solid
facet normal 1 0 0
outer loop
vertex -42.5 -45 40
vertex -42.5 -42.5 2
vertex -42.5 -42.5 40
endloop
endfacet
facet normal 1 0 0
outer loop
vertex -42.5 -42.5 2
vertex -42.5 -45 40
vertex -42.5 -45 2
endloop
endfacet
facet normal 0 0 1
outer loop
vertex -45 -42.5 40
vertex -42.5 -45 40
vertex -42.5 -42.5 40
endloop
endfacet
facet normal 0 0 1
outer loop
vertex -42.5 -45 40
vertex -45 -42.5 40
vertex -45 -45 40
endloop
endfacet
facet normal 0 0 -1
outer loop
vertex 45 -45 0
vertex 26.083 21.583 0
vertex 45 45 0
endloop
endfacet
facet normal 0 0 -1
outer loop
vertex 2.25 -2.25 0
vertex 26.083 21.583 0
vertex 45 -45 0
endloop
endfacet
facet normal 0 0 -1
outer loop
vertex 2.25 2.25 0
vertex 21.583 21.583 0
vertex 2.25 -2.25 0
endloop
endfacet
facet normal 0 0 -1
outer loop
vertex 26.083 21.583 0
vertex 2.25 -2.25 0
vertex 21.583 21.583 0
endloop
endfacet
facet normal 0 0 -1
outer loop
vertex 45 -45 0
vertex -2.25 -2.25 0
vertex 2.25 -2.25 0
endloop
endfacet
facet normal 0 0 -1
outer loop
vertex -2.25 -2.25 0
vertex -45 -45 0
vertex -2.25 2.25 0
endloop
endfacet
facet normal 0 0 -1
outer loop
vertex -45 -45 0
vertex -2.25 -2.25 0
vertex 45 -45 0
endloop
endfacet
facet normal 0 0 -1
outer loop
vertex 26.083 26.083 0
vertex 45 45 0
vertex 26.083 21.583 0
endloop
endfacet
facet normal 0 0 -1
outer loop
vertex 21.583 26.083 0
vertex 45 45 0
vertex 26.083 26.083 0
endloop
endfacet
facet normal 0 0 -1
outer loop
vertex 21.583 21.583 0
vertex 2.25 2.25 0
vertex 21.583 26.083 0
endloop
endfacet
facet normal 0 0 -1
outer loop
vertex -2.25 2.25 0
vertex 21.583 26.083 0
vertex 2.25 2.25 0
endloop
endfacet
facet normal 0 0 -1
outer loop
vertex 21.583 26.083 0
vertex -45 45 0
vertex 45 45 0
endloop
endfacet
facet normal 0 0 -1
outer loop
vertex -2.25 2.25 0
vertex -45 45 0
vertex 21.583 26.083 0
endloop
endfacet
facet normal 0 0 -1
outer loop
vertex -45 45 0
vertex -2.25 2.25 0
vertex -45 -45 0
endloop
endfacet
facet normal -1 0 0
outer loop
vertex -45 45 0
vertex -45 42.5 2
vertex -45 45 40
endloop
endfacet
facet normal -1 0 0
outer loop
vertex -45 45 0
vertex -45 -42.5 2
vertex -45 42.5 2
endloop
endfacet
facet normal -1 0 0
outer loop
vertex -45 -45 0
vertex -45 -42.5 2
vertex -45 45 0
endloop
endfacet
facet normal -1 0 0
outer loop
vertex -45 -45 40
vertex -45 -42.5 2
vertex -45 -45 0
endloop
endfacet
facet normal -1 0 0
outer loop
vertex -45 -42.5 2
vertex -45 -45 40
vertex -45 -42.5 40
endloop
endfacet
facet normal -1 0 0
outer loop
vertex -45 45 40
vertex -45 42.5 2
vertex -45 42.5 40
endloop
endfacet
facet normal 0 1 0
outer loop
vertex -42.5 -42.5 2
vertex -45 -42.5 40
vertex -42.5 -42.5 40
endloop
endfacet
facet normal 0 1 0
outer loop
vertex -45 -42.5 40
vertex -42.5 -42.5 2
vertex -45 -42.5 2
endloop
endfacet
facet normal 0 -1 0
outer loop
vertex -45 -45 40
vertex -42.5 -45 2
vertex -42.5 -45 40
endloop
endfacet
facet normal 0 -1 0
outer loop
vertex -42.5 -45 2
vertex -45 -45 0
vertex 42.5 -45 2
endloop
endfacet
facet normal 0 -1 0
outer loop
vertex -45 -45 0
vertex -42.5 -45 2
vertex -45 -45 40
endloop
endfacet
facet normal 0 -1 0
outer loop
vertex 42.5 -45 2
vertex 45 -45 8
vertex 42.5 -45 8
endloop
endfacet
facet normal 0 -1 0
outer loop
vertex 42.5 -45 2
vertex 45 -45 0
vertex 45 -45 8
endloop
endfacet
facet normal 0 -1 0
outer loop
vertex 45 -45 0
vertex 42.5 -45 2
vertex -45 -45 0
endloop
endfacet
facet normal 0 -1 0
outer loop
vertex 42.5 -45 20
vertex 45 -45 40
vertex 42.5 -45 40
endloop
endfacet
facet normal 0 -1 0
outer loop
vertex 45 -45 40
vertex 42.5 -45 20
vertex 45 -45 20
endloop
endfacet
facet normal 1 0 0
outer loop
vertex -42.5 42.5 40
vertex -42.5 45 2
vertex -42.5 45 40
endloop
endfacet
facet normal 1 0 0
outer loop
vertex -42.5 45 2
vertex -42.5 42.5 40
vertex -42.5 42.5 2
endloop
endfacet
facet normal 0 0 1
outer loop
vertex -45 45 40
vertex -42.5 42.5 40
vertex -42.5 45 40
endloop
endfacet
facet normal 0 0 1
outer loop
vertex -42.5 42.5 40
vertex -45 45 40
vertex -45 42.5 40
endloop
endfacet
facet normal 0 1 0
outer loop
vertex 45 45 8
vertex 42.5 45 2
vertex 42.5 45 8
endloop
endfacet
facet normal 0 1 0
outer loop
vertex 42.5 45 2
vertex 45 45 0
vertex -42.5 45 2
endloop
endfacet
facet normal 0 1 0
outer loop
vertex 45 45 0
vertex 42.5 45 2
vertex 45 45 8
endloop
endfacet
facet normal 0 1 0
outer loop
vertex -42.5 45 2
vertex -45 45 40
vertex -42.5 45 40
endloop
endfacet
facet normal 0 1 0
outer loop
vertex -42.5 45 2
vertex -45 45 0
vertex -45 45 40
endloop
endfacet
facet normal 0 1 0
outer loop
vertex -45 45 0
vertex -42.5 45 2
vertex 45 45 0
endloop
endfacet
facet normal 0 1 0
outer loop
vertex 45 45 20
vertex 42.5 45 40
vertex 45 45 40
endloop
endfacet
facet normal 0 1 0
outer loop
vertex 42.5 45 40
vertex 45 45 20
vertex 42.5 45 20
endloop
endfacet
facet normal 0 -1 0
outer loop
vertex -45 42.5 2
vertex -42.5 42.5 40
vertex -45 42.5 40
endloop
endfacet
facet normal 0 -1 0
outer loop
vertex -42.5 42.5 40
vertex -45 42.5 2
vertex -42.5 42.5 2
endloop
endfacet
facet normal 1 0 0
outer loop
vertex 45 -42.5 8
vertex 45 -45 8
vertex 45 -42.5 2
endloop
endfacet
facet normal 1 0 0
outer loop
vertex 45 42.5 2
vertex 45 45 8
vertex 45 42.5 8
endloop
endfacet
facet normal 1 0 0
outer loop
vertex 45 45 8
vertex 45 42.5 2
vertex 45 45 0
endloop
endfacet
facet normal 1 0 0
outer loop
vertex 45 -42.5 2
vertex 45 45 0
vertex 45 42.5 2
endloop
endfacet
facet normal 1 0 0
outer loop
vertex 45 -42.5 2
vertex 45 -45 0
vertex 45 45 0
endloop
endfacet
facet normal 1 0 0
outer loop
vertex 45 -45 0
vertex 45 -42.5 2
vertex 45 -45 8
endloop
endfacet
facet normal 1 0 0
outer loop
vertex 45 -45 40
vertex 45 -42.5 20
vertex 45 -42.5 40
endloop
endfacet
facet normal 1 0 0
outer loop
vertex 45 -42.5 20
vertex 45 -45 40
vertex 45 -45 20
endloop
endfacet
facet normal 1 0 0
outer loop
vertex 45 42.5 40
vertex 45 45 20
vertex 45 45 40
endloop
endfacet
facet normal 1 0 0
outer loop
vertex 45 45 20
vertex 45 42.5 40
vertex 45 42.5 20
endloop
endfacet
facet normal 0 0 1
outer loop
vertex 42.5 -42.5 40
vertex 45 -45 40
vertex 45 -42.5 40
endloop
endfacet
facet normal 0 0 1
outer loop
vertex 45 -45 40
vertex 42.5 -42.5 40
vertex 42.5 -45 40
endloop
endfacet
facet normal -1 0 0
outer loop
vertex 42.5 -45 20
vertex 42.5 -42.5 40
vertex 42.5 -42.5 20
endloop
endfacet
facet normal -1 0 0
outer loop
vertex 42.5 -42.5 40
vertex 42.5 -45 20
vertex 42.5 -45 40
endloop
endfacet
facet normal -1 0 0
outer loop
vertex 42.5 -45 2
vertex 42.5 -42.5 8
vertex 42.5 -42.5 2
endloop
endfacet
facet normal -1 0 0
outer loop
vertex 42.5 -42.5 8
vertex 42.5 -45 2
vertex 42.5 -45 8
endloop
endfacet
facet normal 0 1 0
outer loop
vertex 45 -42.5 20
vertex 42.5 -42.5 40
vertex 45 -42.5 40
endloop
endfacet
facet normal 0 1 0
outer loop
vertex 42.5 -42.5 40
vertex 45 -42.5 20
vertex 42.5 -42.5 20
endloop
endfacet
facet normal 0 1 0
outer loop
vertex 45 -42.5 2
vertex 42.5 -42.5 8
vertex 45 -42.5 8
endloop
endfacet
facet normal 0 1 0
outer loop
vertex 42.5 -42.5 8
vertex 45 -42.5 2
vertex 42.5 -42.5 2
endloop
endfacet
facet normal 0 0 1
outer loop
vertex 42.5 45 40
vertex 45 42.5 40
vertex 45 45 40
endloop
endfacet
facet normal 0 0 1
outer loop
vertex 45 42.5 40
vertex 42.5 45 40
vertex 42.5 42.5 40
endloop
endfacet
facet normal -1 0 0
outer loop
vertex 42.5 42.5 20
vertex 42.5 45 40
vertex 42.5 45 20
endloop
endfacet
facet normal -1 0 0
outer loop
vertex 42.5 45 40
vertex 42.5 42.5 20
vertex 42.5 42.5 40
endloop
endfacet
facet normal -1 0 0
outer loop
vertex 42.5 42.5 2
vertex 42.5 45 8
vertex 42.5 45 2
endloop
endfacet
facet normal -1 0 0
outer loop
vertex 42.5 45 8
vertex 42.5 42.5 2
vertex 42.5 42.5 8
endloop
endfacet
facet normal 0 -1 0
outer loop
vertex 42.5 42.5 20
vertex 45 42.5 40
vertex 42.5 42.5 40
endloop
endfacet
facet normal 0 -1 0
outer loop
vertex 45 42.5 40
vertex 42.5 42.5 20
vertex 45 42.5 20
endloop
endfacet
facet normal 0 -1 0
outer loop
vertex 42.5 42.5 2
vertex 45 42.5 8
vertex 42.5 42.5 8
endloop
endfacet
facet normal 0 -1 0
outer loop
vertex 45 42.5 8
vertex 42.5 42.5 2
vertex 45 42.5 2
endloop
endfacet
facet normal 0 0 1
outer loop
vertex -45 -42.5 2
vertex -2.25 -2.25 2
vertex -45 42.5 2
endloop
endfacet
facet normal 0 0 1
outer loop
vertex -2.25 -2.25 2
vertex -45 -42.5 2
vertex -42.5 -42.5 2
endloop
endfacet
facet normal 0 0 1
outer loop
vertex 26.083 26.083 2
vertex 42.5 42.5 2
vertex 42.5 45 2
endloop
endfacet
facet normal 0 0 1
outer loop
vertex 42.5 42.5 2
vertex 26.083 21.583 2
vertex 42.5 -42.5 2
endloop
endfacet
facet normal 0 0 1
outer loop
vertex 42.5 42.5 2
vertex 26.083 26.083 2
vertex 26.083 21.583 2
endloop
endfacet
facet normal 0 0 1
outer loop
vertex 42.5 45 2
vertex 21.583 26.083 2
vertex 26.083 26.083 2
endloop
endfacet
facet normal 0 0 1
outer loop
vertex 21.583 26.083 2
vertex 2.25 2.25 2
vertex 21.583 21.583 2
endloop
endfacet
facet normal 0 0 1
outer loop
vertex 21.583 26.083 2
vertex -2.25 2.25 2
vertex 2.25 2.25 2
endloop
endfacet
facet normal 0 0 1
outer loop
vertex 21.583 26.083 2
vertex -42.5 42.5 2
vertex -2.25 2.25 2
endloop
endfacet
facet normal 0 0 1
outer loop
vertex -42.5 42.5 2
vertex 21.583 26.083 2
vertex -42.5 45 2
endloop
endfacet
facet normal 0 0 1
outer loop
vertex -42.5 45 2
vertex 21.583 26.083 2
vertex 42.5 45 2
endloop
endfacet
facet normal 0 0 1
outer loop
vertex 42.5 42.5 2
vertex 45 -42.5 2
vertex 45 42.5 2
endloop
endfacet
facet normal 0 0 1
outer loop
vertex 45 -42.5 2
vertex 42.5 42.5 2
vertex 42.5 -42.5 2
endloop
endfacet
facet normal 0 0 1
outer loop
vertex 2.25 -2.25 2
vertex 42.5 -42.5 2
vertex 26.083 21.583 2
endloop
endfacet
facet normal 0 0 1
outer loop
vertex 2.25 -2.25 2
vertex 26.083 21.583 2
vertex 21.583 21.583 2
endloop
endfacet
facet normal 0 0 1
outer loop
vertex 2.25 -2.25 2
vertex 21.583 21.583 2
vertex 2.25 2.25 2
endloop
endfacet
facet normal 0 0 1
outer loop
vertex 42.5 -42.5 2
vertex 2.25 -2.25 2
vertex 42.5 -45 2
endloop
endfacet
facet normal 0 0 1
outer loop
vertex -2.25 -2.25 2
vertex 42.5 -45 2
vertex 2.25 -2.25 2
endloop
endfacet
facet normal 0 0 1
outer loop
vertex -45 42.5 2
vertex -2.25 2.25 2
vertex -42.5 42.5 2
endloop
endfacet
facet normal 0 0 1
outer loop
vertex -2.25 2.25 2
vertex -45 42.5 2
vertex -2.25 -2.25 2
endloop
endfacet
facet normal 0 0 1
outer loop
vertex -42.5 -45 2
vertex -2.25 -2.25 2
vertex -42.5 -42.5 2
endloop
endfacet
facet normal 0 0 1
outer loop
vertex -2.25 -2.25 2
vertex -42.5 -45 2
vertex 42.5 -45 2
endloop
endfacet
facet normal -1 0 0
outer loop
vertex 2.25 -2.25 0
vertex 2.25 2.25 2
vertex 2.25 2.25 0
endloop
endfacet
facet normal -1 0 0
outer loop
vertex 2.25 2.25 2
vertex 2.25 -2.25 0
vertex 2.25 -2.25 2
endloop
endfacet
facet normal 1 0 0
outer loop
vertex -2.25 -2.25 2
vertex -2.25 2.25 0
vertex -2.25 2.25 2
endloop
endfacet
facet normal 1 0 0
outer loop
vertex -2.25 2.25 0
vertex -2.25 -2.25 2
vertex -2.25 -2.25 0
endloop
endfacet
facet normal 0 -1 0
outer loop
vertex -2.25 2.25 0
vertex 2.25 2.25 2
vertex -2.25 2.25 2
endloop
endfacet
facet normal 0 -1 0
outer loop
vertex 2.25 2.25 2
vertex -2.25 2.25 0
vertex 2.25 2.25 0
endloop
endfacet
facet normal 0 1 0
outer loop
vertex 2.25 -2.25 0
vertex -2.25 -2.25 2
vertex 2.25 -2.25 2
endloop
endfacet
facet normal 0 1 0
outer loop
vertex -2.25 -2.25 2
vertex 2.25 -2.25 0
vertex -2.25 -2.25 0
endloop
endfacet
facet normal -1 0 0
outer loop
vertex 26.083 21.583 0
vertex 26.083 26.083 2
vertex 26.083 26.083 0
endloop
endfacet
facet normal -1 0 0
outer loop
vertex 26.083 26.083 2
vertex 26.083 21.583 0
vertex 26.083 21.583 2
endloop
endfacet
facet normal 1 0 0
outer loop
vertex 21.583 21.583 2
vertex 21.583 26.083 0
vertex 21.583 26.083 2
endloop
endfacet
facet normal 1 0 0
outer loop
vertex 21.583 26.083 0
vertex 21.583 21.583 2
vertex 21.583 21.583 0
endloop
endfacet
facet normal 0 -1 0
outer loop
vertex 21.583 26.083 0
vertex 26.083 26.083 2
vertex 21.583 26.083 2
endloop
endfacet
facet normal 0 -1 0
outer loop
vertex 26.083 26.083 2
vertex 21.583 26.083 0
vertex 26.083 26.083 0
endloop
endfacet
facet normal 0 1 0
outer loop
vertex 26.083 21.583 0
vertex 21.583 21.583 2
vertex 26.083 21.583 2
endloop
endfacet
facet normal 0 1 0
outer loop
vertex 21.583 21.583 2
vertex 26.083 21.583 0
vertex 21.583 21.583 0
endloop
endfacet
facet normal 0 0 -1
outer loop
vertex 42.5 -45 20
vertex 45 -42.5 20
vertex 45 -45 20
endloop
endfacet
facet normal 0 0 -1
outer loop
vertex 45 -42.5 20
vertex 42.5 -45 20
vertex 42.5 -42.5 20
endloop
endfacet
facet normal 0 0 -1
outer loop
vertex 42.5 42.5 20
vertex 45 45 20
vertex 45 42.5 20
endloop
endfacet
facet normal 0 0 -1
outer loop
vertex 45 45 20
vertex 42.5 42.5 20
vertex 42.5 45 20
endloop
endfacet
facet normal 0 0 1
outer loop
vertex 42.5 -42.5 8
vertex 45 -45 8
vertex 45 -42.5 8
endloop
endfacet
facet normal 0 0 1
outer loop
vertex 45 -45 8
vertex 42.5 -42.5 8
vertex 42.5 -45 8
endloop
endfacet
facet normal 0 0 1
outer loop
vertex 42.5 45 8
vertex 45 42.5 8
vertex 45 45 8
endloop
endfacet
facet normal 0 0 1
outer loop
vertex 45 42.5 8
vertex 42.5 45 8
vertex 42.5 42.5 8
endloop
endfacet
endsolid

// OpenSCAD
// Magnetic stirrer housing (print orientation: upside down)
// Units: mm

// ---- Top plate ----
plate_t      = 2;     // plate thickness (z = 0 to 2)
plate_x      = 90;    // plate outer size in X
plate_y      = 90;    // plate outer size in Y

// ---- Walls ----
wall_t       = 2.5;   // wall thickness
wall_top_z   = 40;    // open top of box (walls rise from plate to this)

// ---- Screw holes ----
hole_d       = 4.5;   // M4 screw hole diameter
hole_n       = 4;     // number of holes
hole_pitch   = 71.5;  // square pattern side length

// ---- Cable notch ----
notch_w      = 12;    // notch width along wall
notch_bottom = 8;     // notch depth from open edge (z = 32 to 40)

// ---- Misc ----
eps          = 0.5;   // cutter overshoot past faces
$fn          = 64;    // curve resolution

difference() {
    // Solid body: top plate + four walls, open top
    union() {
        translate([-plate_x/2, -plate_y/2, 0])
            cube([plate_x, plate_y, plate_t]);
        for (sx = [-1, 1], sy = [-1, 1])
            translate([sx > 0 ? plate_x/2 - wall_t : -plate_x/2,
                       sy > 0 ? plate_y/2 - wall_t : -plate_y/2,
                       0])
                cube([wall_t, wall_t, wall_top_z]);
    }

    // Screw holes through top plate
    for (i = [0 : hole_n - 1]) {
        a = hole_pitch * i / (hole_n - 1);
        translate([a - hole_d/2, a - hole_d/2, -eps])
            cube([hole_d, hole_d, plate_t + 2*eps]);
    }

    // Cable notch in one wall (x = 43.5, z = 32 to 40)
    translate([43.5 - notch_w/2, -plate_y/2 - eps, notch_bottom])
        cube([notch_w, plate_y + 2*eps, notch_w]);
}
